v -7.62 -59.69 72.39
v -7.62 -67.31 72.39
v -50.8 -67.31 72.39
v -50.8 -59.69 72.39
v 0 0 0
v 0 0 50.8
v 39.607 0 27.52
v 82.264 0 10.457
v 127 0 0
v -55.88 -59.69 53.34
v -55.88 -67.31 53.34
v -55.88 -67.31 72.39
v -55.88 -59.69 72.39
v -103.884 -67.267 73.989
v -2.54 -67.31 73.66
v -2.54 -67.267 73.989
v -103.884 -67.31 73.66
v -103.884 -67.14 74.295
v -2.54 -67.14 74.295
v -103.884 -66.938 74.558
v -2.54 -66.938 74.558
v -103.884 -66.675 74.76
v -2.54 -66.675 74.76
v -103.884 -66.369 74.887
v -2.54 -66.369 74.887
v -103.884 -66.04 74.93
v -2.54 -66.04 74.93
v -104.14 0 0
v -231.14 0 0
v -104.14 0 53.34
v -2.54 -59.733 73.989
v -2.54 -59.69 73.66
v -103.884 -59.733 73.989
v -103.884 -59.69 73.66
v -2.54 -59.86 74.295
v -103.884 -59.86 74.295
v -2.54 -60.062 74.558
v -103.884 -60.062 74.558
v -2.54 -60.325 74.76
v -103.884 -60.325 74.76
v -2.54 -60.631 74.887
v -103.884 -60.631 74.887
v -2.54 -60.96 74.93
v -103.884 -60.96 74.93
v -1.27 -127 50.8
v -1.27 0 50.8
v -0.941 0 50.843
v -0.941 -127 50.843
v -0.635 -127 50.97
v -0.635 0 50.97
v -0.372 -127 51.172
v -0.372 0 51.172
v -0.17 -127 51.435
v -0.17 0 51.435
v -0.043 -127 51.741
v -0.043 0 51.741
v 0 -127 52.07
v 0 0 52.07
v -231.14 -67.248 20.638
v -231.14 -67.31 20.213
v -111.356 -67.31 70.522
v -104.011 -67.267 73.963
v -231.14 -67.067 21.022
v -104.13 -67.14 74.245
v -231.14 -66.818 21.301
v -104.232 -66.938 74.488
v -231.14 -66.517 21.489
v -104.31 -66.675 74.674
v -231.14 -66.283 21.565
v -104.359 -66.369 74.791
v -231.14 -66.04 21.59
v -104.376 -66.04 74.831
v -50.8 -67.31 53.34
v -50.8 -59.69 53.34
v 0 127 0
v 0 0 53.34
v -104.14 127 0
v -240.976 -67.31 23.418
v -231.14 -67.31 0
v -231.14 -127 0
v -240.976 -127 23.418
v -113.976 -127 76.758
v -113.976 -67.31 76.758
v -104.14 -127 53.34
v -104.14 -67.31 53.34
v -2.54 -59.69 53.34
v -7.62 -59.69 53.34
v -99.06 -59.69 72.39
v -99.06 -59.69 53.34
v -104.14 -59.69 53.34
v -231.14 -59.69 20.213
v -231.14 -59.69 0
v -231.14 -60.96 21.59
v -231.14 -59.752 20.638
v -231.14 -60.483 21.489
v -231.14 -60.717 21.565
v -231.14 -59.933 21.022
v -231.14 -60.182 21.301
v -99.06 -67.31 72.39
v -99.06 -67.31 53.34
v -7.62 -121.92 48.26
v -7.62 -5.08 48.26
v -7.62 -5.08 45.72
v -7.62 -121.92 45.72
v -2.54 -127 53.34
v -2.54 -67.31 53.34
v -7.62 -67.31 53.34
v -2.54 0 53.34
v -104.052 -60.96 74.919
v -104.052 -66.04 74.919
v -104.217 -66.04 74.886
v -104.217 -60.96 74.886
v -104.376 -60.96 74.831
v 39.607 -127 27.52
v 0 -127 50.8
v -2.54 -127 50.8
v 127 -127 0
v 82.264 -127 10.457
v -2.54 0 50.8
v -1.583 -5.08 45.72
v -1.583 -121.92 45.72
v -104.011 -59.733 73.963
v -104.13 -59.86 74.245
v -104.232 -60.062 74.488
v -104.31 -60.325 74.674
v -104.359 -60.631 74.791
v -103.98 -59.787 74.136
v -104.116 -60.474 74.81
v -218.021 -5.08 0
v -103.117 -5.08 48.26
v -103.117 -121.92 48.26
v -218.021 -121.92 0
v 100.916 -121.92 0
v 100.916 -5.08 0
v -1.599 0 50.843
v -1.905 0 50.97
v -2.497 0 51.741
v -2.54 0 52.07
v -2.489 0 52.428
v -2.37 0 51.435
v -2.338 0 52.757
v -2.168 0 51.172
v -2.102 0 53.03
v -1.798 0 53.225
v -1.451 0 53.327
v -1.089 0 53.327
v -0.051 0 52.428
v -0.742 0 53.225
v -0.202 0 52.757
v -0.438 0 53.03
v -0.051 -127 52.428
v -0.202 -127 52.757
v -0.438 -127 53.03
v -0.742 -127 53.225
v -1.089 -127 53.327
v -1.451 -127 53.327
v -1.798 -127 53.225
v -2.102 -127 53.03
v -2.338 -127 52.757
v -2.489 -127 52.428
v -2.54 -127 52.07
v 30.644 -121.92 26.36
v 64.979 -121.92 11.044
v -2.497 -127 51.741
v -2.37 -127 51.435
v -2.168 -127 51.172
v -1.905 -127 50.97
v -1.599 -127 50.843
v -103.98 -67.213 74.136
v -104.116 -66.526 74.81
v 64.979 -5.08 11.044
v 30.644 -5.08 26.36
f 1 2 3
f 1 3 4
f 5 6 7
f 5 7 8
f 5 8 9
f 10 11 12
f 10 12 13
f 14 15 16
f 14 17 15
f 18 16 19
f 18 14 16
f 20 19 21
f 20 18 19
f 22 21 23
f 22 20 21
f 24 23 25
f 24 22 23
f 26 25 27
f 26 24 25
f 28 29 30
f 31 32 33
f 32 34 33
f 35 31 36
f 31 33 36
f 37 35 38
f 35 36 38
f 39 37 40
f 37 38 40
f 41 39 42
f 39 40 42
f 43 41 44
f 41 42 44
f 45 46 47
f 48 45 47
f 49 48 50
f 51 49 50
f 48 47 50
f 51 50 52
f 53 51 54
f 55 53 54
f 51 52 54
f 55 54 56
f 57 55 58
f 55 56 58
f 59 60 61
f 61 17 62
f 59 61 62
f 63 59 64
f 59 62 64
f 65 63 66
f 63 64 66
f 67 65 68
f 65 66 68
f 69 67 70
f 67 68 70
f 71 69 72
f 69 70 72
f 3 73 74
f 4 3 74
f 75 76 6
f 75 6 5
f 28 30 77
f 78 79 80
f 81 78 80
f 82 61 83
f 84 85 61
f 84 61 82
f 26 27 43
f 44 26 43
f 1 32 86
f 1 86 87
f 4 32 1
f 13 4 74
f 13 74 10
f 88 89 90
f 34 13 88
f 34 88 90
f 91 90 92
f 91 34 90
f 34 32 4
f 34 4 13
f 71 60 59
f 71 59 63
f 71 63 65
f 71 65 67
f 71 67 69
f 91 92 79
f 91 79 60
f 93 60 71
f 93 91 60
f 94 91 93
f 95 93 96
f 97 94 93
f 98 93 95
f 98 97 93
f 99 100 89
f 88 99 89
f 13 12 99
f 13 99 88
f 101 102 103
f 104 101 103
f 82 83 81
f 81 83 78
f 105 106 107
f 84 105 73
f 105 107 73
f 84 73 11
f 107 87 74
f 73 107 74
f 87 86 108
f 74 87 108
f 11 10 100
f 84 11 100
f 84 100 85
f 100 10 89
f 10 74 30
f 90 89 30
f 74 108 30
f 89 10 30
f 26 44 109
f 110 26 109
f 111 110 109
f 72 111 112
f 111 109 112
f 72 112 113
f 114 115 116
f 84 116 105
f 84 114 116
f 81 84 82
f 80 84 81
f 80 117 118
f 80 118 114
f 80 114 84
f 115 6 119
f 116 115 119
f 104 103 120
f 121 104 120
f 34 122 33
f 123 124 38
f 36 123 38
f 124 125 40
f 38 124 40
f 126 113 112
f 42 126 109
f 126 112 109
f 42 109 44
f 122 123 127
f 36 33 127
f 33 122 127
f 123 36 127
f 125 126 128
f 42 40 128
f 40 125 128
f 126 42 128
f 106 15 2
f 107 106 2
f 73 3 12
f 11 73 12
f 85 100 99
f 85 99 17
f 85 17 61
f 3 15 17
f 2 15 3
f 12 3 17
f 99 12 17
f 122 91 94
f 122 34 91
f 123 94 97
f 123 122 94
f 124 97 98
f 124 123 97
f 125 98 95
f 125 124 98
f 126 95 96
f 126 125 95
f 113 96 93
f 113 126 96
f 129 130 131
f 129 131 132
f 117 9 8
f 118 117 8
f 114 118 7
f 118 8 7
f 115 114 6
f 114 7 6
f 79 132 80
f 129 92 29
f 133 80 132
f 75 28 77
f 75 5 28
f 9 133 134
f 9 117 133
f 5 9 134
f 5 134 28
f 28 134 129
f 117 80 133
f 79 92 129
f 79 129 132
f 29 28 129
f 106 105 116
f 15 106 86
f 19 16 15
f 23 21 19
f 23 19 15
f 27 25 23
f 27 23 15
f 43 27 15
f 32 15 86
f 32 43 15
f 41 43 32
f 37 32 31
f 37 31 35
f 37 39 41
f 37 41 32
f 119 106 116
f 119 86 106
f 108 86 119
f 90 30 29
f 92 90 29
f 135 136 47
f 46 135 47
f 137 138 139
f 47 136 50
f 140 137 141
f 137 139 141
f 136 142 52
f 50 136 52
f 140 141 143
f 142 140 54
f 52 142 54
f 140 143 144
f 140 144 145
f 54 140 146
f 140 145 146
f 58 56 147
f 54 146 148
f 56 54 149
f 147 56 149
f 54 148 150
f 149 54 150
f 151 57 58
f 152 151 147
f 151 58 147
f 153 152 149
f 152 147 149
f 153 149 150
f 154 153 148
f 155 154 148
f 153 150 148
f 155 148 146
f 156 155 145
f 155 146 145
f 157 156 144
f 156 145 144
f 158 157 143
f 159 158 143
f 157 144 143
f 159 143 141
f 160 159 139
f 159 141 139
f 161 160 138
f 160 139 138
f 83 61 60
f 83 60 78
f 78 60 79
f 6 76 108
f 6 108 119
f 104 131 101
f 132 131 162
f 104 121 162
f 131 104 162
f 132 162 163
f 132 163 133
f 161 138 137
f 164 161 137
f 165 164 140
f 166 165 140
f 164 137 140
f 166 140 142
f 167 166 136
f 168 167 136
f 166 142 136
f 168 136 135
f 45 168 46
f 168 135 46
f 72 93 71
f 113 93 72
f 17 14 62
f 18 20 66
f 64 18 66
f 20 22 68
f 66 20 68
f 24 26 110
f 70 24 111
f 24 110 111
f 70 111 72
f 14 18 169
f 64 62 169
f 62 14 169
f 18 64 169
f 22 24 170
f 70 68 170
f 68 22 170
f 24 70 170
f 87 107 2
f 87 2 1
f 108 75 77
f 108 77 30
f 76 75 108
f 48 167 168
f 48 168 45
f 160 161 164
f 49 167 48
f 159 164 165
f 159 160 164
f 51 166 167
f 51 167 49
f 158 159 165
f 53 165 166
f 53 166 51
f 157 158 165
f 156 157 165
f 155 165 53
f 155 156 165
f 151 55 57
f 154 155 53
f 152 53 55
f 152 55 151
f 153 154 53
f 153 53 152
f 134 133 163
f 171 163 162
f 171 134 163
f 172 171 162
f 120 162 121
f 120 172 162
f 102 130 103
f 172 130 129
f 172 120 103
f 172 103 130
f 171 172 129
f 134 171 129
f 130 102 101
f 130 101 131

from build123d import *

# Parameters (mm, degrees)
F1_DEPTH     = 127
F2_W         = 5.08
F2_H         = 7.62
F3_DEPTH     = 19.05
F4_W         = 7.62
F4_H         = 2.54
F5_DEPTH     = 101.6
F6_T         = 5.08
F6_T3_DEPTH  = 17.78
F6_T5_DEPTH  = 15.24
F6_T7_DEPTH  = 15.24
F6_T9_DEPTH  = 15.24
F6_T11_DEPTH = 137.16
F8_DEPTH     = 7.62
F10_DEPTH    = 104.14
F11_R        = 1.27
F12_DEPTH    = 25.4


# Not quite as in the source:
# - a shell that OpenCascade refuses in one call is made with other operations: the cavity is built on its own and cut out
# - a feature names something its author has since deleted; it is built from what else it names


with BuildPart() as f1:
    # F0 (on Front) → F1 (new body)
    with BuildSketch(Plane.XZ):
        with BuildLine():
            Line((0, 50.8), (0, 0))
            Line((0, 0), (127, 0))
            ThreePointArc((127, 0), (60.6135499229, 18.1838748072), (0, 50.8))
        make_face()
        Polygon((-104.14, 0), (-2.54, 0), (-2.54, 50.8), (-2.54, 52.07), (-2.54, 53.34), (-104.14, 53.34), align=None)
        Polygon((-2.54, 0), (0, 0), (0, 50.8), (-1.27, 50.8), (-2.54, 50.8), align=None)
        Polygon((-231.14, 0), (-104.14, 0), (-104.14, 53.34), align=None)
    extrude(amount=F1_DEPTH)

    # F2 (on face) → F3 (join)
    with BuildSketch(Plane.XY.offset(53.34)):
        with Locations((-101.6, -63.5)):
            Rectangle(F2_W, F2_H)
        with Locations((-5.08, -63.5)):
            Rectangle(F2_W, F2_H)
        with Locations((-53.34, -63.5)):
            Rectangle(F2_W, F2_H)
    extrude(amount=F3_DEPTH)

    # F4 (on face) → F5 (join)
    with BuildSketch(Plane.YZ.offset(-2.54)):
        with Locations((-63.5, 73.66)):
            Rectangle(F4_W, F4_H)
    extrude(amount=-F5_DEPTH)

    # F6: shell of thickness 5.08, made by hand


with BuildPart() as f1b:
    # F0 (on Front) → F1, piece 2 (new body)
    with BuildSketch(Plane.XZ):
        with BuildLine():
            ThreePointArc((-2.54, 52.07), (-2.1680256121, 51.1719743879), (-1.27, 50.8))
            ThreePointArc((-1.27, 50.8), (-0.3719743879, 51.1719743879), (0, 52.07))
            ThreePointArc((0, 52.07), (-1.27, 53.34), (-2.54, 52.07))
        make_face()
    extrude(amount=F1_DEPTH)


with BuildPart() as f6_core1:
    # F6_t2: copy of F1
    add(f1.part)

    # the walls: a layer under each face that stays
    f6_faces = [f6_core1.faces().sort_by_distance(p)[0] for p in [
        (60.6135499229, -63.5, 18.1838748072),
        (-52.07, -127, 26.67),
        (-167.64, -63.5, 26.67),
        (-104.14, -63.5, 64.135),
        (-53.34, -67.31, 64.135),
        (-99.06, -63.5, 62.865),
        (-77.47, -63.5, 72.39),
        (-55.88, -63.5, 62.865),
        (-50.8, -63.5, 62.865),
        (-29.21, -63.5, 72.39),
        (-7.62, -63.5, 62.865),
        (-53.34, -63.5, 74.93),
        (-53.34, -59.69, 64.135),
        (-19.4733333333, -105.8333333333, 53.34),
        (-2.54, -63.5, 62.865),
        (-52.07, 0, 26.67),
        (-1.27, -63.5, 50.8),
    ]]
    thicken(f6_faces, amount=-F6_T, mode=Mode.SUBTRACT)

    # F6_s4 → F6_t3 (cut)
    with BuildSketch(Plane.XZ.offset(54.61)):
        Polygon((-104.2104714102, 53.386836691), (-102.1728589795, 48.6563309035), (-99.06, 49.9637316749), (-99.06, 53.34), align=None)
        Polygon((-99.0092, 53.3908), (-104.14, 53.34), (-104.14, 48.26), (-99.06, 48.26), align=None)
        Polygon((-99.0092, 72.3392), (-104.14, 72.39), (-104.14, 77.47), (-99.06, 77.47), align=None)
        Polygon((-55.9308, 72.3392), (-55.88, 77.47), (-50.8, 77.47), (-50.8, 72.39), align=None)
        Polygon((-55.9308, 53.3908), (-50.8, 53.34), (-50.8, 48.26), (-55.88, 48.26), align=None)
        Polygon((-50.7492, 53.3908), (-55.88, 53.34), (-55.88, 48.26), (-50.8, 48.26), align=None)
        Polygon((-50.7492, 72.3392), (-55.88, 72.39), (-55.88, 77.47), (-50.8, 77.47), align=None)
        Polygon((-7.6708, 72.3392), (-7.62, 77.47), (-2.54, 77.47), (-2.54, 72.39), align=None)
        Polygon((-7.6708, 53.3908), (-2.54, 53.34), (-2.54, 48.26), (-7.62, 48.26), align=None)
    extrude(amount=F6_T3_DEPTH, mode=Mode.SUBTRACT)

    # F6_s6 → F6_t5 (cut)
    with BuildSketch(Plane.YZ.offset(-60.96)):
        Polygon((-67.3608, 53.3908), (-62.23, 53.34), (-62.23, 48.26), (-67.31, 48.26), align=None)
        Polygon((-59.6392, 53.3908), (-64.77, 53.34), (-64.77, 48.26), (-59.69, 48.26), align=None)
    extrude(amount=F6_T5_DEPTH, mode=Mode.SUBTRACT)

    # F6_s8 → F6_t7 (cut)
    with BuildSketch(Plane.YZ.offset(-109.22)):
        Polygon((-67.3608, 53.3908), (-62.23, 53.34), (-62.23, 48.26), (-67.31, 48.26), align=None)
        Polygon((-59.6392, 53.3908), (-64.77, 53.34), (-64.77, 48.26), (-59.69, 48.26), align=None)
    extrude(amount=F6_T7_DEPTH, mode=Mode.SUBTRACT)

    # F6_s10 → F6_t9 (cut)
    with BuildSketch(Plane.YZ.offset(-12.7)):
        Polygon((-67.3608, 53.3908), (-62.23, 53.34), (-62.23, 48.26), (-67.31, 48.26), align=None)
        Polygon((-59.6392, 53.3908), (-64.77, 53.34), (-64.77, 48.26), (-59.69, 48.26), align=None)
    extrude(amount=F6_T9_DEPTH, mode=Mode.SUBTRACT)

    # F6_s12 → F6_t11 (cut)
    with BuildSketch(Plane.XZ.offset(-5.08)):
        Polygon((-2.4892, 50.8508), (-7.62, 50.8), (-7.62, 45.72), (-2.54, 45.72), align=None)
    extrude(amount=F6_T11_DEPTH, mode=Mode.SUBTRACT)


with BuildPart() as f1_1:
    add(f1.part)

    # what is left inside the walls is the cavity
    f6_cavity = [f6_core1.part.solids().sort_by_distance(p)[0] for p in [
        (-58.552758, -82.973333, 0.0508),
    ]]
    add(f6_cavity, mode=Mode.SUBTRACT)

    # F7 (on face) → F8 (join)
    with BuildSketch(Plane(origin=(0, -59.69, 0), x_dir=(-1, 0, 0), z_dir=(0, 1, 0))):
        Polygon((231.14, 21.59), (104.14, 74.93), (104.14, 53.34), (231.14, 0), align=None)
    extrude(amount=-F8_DEPTH)

    # F9 (on Right) → F10 (join)
    with BuildSketch(Plane.YZ):
        Polygon((127, 0), (0, 53.34), (0, 0), align=None)
    extrude(amount=-F10_DEPTH)

    # F11
    f11_edges = [f1_1.edges().sort_by_distance(p)[0] for p in [
        (-53.34, -67.31, 74.93),
        (-167.64, -67.31, 48.26),
        (-104.14, -63.5, 74.93),
        (-167.64, -59.69, 48.26),
        (-53.34, -59.69, 74.93),
    ]]
    fillet(f11_edges, radius=F11_R)

    # F12 (add): a face of the model
    f12_faces = [f1_1.faces().sort_by_distance(p)[0] for p in [
        (-167.64, -97.155, 26.67),
    ]]
    extrude(f12_faces, amount=F12_DEPTH)


solid = Compound([f1b.part, f1_1.part])
